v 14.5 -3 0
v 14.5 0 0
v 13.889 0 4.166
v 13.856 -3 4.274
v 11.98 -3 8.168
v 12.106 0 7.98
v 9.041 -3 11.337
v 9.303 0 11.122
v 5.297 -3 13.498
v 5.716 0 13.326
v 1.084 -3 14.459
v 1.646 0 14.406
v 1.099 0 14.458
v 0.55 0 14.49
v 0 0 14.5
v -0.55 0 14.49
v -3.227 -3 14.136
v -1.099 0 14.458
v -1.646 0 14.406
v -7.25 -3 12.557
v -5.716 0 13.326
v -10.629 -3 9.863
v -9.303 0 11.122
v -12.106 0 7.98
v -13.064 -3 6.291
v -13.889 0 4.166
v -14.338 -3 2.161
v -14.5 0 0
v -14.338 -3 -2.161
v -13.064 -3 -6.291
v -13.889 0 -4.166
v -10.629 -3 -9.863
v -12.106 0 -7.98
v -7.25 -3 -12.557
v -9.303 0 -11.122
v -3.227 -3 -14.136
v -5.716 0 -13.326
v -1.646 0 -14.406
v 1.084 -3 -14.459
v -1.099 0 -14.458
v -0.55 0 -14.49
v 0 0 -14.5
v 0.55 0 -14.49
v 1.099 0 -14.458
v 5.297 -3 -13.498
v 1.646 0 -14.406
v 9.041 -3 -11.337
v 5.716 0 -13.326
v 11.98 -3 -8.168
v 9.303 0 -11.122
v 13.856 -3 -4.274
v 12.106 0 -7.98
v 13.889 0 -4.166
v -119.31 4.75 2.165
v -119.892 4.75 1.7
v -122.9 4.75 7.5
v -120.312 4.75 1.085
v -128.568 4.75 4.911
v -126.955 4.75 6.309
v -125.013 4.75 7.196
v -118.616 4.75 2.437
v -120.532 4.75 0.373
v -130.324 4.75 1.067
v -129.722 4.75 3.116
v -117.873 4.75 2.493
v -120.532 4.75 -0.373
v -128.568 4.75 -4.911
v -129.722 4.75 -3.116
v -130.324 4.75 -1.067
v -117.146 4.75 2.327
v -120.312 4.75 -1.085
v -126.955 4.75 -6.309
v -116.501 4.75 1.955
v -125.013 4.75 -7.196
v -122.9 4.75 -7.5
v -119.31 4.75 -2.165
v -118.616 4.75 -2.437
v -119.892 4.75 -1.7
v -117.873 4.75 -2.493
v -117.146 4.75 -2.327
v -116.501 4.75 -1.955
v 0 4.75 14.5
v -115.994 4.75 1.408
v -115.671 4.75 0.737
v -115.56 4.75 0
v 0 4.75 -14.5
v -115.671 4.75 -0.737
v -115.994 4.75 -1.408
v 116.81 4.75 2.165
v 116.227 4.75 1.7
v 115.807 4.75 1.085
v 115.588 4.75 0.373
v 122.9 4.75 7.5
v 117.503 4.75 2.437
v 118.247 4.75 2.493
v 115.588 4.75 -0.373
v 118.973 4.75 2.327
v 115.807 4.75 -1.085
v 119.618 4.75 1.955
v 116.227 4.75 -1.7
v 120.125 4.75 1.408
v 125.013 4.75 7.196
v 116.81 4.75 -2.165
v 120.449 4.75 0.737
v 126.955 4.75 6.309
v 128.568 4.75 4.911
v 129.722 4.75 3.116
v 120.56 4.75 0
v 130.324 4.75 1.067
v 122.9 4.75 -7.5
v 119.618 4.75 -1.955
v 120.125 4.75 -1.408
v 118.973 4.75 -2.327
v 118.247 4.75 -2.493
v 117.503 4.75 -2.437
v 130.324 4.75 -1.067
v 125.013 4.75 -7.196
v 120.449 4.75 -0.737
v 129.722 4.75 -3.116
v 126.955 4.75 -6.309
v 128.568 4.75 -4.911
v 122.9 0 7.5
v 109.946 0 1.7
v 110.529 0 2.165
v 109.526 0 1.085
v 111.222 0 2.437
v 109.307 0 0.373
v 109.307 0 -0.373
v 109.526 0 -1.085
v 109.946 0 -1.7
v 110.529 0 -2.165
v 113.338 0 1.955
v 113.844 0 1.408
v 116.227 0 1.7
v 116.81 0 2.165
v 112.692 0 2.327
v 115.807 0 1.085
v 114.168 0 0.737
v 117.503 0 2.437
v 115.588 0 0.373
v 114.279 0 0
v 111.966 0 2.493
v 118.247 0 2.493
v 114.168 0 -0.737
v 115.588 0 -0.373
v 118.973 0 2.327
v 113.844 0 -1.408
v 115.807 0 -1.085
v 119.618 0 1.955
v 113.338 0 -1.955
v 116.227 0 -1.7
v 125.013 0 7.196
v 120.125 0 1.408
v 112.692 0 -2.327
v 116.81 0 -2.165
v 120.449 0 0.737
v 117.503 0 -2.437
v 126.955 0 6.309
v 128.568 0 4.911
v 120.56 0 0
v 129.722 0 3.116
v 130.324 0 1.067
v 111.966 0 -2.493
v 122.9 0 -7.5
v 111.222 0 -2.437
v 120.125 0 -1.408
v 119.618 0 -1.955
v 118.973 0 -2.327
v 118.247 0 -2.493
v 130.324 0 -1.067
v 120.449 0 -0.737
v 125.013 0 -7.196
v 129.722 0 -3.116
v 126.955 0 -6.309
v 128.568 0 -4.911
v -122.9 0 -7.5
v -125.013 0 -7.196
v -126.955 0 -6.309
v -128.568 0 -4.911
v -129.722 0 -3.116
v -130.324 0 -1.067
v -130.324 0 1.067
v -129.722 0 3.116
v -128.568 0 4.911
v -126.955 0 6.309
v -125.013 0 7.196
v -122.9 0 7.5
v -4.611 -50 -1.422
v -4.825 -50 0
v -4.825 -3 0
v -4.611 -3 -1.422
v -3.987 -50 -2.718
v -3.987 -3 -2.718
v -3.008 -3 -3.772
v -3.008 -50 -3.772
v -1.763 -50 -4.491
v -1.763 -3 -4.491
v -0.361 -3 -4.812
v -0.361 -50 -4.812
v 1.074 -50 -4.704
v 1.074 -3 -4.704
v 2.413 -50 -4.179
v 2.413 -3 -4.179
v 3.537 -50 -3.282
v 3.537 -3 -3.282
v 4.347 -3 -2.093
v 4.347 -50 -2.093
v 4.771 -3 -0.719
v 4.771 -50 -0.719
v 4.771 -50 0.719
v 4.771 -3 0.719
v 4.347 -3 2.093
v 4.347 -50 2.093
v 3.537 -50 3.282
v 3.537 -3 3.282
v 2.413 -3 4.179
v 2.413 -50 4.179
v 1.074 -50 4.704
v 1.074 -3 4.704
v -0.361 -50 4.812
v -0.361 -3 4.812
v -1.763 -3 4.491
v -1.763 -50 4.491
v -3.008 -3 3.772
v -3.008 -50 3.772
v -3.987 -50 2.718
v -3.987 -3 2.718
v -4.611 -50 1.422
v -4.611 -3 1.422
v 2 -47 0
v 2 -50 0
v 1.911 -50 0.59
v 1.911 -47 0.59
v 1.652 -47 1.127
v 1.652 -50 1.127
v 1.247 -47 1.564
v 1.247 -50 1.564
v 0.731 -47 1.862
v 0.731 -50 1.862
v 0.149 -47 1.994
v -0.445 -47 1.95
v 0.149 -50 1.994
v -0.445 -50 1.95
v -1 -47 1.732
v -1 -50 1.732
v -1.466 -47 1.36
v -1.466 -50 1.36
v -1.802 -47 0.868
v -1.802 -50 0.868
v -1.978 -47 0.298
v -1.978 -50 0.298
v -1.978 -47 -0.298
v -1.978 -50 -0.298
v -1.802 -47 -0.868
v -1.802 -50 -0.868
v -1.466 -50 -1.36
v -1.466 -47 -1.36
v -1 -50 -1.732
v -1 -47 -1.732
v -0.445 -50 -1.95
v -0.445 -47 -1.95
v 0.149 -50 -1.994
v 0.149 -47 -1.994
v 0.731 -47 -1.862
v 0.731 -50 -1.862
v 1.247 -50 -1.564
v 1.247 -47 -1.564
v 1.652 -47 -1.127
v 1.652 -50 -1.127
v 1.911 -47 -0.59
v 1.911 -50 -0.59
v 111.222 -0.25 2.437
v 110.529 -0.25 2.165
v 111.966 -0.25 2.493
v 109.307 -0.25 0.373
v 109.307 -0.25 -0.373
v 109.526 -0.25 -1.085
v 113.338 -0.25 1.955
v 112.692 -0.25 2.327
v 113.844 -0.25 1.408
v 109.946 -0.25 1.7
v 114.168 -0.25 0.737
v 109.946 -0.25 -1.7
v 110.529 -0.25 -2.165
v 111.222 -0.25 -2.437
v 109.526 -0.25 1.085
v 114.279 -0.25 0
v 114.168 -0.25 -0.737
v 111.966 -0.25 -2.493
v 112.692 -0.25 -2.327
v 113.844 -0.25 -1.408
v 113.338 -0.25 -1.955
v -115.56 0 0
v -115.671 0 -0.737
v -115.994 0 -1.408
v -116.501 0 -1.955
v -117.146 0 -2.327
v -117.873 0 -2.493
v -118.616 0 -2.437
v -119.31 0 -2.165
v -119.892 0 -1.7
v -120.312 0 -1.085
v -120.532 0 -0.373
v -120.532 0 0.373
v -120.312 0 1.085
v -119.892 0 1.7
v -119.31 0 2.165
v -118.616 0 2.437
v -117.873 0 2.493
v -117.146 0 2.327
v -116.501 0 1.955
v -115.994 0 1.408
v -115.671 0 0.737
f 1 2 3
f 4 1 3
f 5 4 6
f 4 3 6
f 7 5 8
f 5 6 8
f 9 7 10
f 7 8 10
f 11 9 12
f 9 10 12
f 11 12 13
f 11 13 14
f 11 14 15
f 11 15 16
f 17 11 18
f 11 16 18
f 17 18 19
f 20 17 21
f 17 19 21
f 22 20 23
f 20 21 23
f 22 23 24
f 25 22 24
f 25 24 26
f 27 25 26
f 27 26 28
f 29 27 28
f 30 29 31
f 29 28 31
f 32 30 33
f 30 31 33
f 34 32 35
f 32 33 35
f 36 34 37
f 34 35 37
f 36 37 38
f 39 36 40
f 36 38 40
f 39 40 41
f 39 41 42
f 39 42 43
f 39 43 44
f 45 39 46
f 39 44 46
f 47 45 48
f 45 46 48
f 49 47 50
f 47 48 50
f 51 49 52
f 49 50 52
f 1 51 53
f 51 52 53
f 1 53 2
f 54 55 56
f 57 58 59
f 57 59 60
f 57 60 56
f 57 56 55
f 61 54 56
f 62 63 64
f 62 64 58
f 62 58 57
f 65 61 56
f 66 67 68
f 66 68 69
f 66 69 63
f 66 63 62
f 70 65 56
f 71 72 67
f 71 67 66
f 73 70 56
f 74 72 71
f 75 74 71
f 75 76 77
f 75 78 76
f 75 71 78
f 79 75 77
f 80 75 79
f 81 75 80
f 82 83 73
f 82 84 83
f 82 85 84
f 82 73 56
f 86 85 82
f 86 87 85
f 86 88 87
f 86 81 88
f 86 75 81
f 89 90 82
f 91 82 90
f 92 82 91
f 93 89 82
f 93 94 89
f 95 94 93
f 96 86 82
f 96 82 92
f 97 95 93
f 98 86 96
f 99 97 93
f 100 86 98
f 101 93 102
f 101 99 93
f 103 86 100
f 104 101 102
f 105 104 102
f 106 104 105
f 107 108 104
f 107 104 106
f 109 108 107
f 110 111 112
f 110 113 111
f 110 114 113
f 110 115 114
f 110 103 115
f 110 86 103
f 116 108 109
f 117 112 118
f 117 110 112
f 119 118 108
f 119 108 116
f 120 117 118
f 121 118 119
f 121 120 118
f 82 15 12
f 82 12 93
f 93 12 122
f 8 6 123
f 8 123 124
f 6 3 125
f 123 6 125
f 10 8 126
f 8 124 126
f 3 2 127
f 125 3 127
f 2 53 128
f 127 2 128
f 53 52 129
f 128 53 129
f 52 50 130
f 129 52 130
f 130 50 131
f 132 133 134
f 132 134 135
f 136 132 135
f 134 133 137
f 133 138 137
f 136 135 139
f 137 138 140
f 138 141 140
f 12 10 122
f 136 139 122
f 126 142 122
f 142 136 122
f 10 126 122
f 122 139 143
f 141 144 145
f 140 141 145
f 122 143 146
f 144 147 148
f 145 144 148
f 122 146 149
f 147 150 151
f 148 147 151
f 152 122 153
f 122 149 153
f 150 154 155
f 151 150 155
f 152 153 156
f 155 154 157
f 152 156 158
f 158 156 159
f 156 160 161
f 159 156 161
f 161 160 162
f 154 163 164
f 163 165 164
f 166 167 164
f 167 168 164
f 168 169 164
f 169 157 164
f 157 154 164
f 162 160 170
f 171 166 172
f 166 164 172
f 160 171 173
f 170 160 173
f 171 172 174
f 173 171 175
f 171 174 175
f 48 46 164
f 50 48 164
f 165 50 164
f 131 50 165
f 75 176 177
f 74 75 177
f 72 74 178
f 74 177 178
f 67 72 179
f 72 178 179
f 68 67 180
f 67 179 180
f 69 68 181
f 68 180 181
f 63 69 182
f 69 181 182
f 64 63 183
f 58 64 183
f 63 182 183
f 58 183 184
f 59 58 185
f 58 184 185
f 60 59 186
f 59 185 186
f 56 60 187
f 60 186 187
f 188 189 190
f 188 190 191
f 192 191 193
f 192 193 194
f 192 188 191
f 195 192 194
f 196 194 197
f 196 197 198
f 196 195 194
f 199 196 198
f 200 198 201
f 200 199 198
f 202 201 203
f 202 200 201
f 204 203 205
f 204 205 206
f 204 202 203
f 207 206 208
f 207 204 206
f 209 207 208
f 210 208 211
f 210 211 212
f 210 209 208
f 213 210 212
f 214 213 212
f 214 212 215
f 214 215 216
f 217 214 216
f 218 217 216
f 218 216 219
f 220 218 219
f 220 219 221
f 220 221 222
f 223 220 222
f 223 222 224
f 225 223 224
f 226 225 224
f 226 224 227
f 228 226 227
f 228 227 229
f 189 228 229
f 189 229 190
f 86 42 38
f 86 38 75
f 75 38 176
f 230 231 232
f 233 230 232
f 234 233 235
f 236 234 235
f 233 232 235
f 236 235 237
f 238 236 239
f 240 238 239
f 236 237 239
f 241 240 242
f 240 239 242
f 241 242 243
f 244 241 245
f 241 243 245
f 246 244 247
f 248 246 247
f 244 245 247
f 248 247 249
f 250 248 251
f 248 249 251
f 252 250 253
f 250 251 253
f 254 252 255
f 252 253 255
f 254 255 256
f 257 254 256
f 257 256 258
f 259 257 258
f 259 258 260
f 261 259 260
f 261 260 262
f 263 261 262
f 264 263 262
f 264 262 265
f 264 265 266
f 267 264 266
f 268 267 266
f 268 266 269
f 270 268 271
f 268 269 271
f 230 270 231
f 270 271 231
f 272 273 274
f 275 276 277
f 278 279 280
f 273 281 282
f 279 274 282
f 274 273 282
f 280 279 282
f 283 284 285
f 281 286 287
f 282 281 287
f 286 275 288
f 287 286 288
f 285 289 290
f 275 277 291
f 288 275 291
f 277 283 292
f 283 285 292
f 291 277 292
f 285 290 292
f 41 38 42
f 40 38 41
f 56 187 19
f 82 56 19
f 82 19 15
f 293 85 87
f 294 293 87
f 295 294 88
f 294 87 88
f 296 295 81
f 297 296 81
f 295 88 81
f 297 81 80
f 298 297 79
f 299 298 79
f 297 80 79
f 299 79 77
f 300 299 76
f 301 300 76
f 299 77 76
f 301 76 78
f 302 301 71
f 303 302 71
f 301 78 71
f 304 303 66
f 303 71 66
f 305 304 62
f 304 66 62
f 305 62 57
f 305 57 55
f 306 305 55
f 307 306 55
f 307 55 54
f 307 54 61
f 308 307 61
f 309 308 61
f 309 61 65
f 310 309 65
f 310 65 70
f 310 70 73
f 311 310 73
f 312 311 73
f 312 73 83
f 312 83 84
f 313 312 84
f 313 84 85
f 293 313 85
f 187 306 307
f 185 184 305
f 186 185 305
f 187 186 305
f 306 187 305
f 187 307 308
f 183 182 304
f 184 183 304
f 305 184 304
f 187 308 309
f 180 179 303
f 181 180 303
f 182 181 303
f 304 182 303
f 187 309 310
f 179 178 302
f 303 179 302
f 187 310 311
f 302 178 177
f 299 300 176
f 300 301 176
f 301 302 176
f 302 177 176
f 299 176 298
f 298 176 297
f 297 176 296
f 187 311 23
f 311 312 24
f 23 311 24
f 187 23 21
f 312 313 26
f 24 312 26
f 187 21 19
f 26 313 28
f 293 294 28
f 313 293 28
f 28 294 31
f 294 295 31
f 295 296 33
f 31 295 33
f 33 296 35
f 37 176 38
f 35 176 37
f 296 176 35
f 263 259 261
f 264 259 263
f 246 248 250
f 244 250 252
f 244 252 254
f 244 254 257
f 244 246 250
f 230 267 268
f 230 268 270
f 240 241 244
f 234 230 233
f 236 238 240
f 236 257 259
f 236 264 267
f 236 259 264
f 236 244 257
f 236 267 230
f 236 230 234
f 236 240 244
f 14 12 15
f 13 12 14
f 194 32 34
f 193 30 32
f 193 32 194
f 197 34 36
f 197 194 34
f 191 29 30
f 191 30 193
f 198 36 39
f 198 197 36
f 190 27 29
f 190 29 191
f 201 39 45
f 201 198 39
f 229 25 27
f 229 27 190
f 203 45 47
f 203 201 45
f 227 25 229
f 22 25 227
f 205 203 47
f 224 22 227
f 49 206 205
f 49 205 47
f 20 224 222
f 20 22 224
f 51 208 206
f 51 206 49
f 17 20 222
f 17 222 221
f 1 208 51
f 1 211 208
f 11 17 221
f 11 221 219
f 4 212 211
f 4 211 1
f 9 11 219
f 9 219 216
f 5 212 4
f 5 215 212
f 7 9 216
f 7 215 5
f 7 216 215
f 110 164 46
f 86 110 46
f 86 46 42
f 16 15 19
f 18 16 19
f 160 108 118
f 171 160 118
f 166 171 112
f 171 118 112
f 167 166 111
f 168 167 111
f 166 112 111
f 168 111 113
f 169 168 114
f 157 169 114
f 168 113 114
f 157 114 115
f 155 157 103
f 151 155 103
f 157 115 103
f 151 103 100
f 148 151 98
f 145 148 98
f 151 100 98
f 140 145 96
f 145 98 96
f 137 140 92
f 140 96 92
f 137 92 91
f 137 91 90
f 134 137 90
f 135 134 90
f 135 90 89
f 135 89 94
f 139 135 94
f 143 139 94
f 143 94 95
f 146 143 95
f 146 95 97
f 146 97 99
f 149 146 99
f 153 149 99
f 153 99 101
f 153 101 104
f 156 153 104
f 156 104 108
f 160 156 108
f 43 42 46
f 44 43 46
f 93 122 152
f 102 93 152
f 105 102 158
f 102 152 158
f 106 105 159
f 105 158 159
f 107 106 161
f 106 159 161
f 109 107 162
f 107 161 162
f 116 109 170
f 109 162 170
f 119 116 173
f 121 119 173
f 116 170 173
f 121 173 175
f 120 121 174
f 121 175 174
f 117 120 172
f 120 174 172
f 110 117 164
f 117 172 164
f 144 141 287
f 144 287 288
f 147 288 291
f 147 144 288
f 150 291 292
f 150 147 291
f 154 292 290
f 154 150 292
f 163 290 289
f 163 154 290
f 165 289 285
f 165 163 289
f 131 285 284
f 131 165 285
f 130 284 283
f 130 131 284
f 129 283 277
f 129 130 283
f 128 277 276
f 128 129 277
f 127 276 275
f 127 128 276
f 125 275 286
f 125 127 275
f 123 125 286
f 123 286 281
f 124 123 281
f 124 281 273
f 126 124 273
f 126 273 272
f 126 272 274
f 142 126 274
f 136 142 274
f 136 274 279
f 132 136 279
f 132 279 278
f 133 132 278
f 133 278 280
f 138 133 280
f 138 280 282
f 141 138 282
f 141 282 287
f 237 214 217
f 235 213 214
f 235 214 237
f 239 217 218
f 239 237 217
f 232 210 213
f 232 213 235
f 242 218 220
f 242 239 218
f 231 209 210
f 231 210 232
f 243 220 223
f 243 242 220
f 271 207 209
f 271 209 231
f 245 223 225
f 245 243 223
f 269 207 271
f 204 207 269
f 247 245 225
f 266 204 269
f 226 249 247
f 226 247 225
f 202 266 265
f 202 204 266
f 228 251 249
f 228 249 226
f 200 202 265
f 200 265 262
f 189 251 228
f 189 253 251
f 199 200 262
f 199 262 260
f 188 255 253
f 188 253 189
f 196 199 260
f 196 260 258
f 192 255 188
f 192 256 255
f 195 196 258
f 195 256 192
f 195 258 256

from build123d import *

# Parameters (mm, degrees)
BOSS_EXTRUDE1_DEPTH = 4.75
SKETCH1_4_R         = 4.75
BOSS_EXTRUDE2_DEPTH = 50
SKETCH3_R           = 14.5
BOSS_EXTRUDE3_DEPTH = 3
CUT_EXTRUDE1_REACH  = 56.75
SKETCH4_R           = 2.5
SKETCH5_R           = 2.5
CUT_EXTRUDE2_DEPTH  = 5
SKETCH6_R           = 2.5
BOSS_EXTRUDE5_DEPTH = 5
BOSS_EXTRUDE6_REACH = 56.75
SKETCH7_R           = 4.825
SKETCH8_R           = 2
CUT_EXTRUDE3_DEPTH  = 3


with BuildPart() as part:
    # Sketch1 → Boss-Extrude1 (new body)
    with BuildSketch(Plane(origin=(0, 0, 0), x_dir=(1, 0, 0), z_dir=(0, 1, 0))):
        with BuildLine():
            Line((0, 14.5), (-122.9, 7.5))
            ThreePointArc((-122.9, 7.5), (-130.4, 0), (-122.9, -7.5))
            Line((-122.9, -7.5), (0, -14.5))
            Line((0, -14.5), (122.9, -7.5))
            ThreePointArc((122.9, -7.5), (130.4, 0), (122.9, 7.5))
            Line((122.9, 7.5), (0, 14.5))
        make_face()
    extrude(amount=BOSS_EXTRUDE1_DEPTH)

    # Sketch1<4> → Boss-Extrude2 (add)
    with BuildSketch(Plane(origin=(0, 0, 0), x_dir=(1, 0, 0), z_dir=(0, 1, 0))):
        Circle(SKETCH1_4_R)
    extrude(amount=-BOSS_EXTRUDE2_DEPTH)

    # Sketch3 → Boss-Extrude3 (add)
    with BuildSketch(Plane.XZ):
        Circle(SKETCH3_R)
    extrude(amount=BOSS_EXTRUDE3_DEPTH)

    # Sketch4 → Cut-Extrude1 (cut, up to next)
    with BuildSketch(Plane(origin=(0, 4.75, 0), x_dir=(1, 0, 0), z_dir=(0, 1, 0)), mode=Mode.PRIVATE) as cut_extrude1_sk1:
        with Locations((111.778793877, 0)):
            Circle(SKETCH4_R)
    cut_extrude1_tool1 = extrude(cut_extrude1_sk1.sketch, amount=-CUT_EXTRUDE1_REACH, mode=Mode.PRIVATE) & part.part
    add(cut_extrude1_tool1.solids().sort_by_distance((111.778794, 4.75, 0))[0], mode=Mode.SUBTRACT)
    # Sketch4 → Cut-Extrude1 (cut, up to next)
    with BuildSketch(Plane(origin=(0, 4.75, 0), x_dir=(1, 0, 0), z_dir=(0, 1, 0)), mode=Mode.PRIVATE) as cut_extrude1_sk2:
        with Locations((-118.05968216, 0)):
            Circle(SKETCH4_R)
    cut_extrude1_tool2 = extrude(cut_extrude1_sk2.sketch, amount=-CUT_EXTRUDE1_REACH, mode=Mode.PRIVATE) & part.part
    add(cut_extrude1_tool2.solids().sort_by_distance((-118.059682, 4.75, 0))[0], mode=Mode.SUBTRACT)

    # Sketch5 → Cut-Extrude2 (cut)
    with BuildSketch(Plane(origin=(0, 4.75, 0), x_dir=(1, 0, 0), z_dir=(0, 1, 0))):
        with Locations((-118.05968216, 0)):
            Circle(SKETCH5_R)
        with Locations((118.05968216, 0)):
            Circle(SKETCH5_R)
    extrude(amount=-CUT_EXTRUDE2_DEPTH, mode=Mode.SUBTRACT)

    # Sketch6 → Boss-Extrude5 (add)
    with BuildSketch(Plane(origin=(0, 4.75, 0), x_dir=(1, 0, 0), z_dir=(0, 1, 0))):
        with Locations((111.778793877, 0)):
            Circle(SKETCH6_R)
    extrude(amount=-BOSS_EXTRUDE5_DEPTH)

    # Sketch7 → Boss-Extrude6 (add, up to next)
    with BuildSketch(Plane(origin=(0, -50, 0), x_dir=(-1, 0, 0), z_dir=(0, -1, 0)), mode=Mode.PRIVATE) as boss_extrude6_sk1:
        Circle(SKETCH7_R)
    boss_extrude6_tool1 = extrude(boss_extrude6_sk1.sketch, amount=-BOSS_EXTRUDE6_REACH, mode=Mode.PRIVATE) - part.part
    add(boss_extrude6_tool1.solids().sort_by_distance((0, -50, 0))[0])

    # Sketch8 → Cut-Extrude3 (cut)
    with BuildSketch(Plane.XZ.offset(50)):
        Circle(SKETCH8_R)
    extrude(amount=-CUT_EXTRUDE3_DEPTH, mode=Mode.SUBTRACT)


solid = part.part
